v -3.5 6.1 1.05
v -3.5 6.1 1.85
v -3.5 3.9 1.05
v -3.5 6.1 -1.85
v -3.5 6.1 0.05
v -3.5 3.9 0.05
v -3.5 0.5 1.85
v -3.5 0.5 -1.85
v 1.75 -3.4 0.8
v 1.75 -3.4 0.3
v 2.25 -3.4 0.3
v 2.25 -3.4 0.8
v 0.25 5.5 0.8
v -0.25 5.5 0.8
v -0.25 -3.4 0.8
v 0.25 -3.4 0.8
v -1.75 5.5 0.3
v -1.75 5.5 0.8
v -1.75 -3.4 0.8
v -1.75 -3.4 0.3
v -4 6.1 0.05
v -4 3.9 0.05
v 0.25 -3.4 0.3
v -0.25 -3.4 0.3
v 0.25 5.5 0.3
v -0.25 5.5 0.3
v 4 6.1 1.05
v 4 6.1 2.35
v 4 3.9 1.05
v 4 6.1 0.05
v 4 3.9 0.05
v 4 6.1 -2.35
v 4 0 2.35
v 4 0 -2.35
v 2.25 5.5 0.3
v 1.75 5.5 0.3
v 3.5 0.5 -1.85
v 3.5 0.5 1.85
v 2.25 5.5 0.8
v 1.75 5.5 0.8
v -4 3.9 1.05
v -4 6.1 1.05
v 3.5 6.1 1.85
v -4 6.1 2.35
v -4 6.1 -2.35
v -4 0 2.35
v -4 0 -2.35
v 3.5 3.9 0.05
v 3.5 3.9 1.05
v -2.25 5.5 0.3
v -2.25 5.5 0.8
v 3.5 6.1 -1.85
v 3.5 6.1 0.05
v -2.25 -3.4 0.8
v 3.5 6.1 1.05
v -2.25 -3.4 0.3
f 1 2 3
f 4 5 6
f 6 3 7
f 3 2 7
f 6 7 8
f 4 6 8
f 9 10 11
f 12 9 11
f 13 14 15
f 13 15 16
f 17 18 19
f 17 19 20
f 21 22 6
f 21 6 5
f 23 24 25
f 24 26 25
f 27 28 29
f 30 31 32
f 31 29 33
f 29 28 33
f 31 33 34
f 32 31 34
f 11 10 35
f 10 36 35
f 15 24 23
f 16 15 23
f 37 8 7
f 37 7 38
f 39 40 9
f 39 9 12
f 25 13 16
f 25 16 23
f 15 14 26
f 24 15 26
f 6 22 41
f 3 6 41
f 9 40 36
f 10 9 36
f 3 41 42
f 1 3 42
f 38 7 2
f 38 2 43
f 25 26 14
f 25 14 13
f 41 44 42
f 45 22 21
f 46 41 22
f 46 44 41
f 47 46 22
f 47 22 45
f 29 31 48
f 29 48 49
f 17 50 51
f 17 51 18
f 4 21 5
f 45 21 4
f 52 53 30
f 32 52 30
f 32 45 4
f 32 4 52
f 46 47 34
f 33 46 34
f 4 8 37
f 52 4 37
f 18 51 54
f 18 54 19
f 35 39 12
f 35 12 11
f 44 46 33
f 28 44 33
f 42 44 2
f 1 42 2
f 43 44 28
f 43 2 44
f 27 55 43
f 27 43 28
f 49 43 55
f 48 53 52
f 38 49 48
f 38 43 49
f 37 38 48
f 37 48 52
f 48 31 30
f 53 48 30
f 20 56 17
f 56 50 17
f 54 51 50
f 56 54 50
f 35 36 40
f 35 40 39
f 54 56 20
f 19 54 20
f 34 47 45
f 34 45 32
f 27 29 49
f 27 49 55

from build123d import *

# Parameters (mm, degrees)
SKETCH1_W                  = 8
SKETCH1_H                  = 4.7
BOSS_EXTRUDE1_DEPTH        = 6.1
SHELL1_T                   = -0.5
SKETCH2_W                  = 0.5
SKETCH2_H                  = 0.5
BOSS_EXTRUDE2_DEPTH        = 5
BOSS_EXTRUDE2_DEPTH_BACK   = 3.9
BOSS_EXTRUDE2_2_DEPTH      = 5
BOSS_EXTRUDE2_2_DEPTH_BACK = 3.9
BOSS_EXTRUDE2_3_DEPTH      = 5
BOSS_EXTRUDE2_3_DEPTH_BACK = 3.9
SKETCH3_W                  = 1
SKETCH3_H                  = 2.2
CUT_EXTRUDE1_DEPTH         = 7.5


with BuildPart() as part:
    # Sketch1 → Boss-Extrude1 (new body)
    with BuildSketch(Plane(origin=(0, 0, 0), x_dir=(1, 0, 0), z_dir=(0, 1, 0))):
        Rectangle(SKETCH1_W, SKETCH1_H)
    extrude(amount=BOSS_EXTRUDE1_DEPTH)

    # Shell1
    shell1_openings = [part.faces().sort_by_distance(p)[0] for p in [
        (0, 6.1, 0),
    ]]
    offset(amount=SHELL1_T, openings=shell1_openings, kind=Kind.INTERSECTION)

    # Sketch3 → Cut-Extrude1 (cut)
    with BuildSketch(Plane.ZY.offset(4)):
        with Locations((0.55, 5)):
            Rectangle(SKETCH3_W, SKETCH3_H)
    cut_extrude1 = extrude(amount=-CUT_EXTRUDE1_DEPTH, mode=Mode.SUBTRACT)

    # Mirror1: Cut-Extrude1 across plane
    add(cut_extrude1.mirror(Plane(origin=(0, 0, 0), x_dir=(0, 0, 1), z_dir=(1, 0, 0))), mode=Mode.SUBTRACT)


with BuildPart() as body_2:
    # Sketch2 → Boss-Extrude2 (new body, two sides)
    with BuildSketch(Plane(origin=(0, 0.5, 0), x_dir=(1, 0, 0), z_dir=(0, 1, 0))) as boss_extrude2_sk:
        with Locations((0, -0.55)):
            Rectangle(SKETCH2_W, SKETCH2_H)
    extrude(amount=BOSS_EXTRUDE2_DEPTH)
    extrude(boss_extrude2_sk.sketch, amount=-BOSS_EXTRUDE2_DEPTH_BACK)


with BuildPart() as body_3:
    # Sketch2 → Boss-Extrude2 2 (new body, two sides)
    with BuildSketch(Plane(origin=(0, 0.5, 0), x_dir=(1, 0, 0), z_dir=(0, 1, 0))) as boss_extrude2_2_sk:
        with Locations((-2, -0.55)):
            Rectangle(SKETCH2_W, SKETCH2_H)
    extrude(amount=BOSS_EXTRUDE2_2_DEPTH)
    extrude(boss_extrude2_2_sk.sketch, amount=-BOSS_EXTRUDE2_2_DEPTH_BACK)


with BuildPart() as body_4:
    # Sketch2 → Boss-Extrude2 3 (new body, two sides)
    with BuildSketch(Plane(origin=(0, 0.5, 0), x_dir=(1, 0, 0), z_dir=(0, 1, 0))) as boss_extrude2_3_sk:
        with Locations((2, -0.55)):
            Rectangle(SKETCH2_W, SKETCH2_H)
    extrude(amount=BOSS_EXTRUDE2_3_DEPTH)
    extrude(boss_extrude2_3_sk.sketch, amount=-BOSS_EXTRUDE2_3_DEPTH_BACK)


solid = Compound([part.part, body_2.part, body_3.part, body_4.part])
